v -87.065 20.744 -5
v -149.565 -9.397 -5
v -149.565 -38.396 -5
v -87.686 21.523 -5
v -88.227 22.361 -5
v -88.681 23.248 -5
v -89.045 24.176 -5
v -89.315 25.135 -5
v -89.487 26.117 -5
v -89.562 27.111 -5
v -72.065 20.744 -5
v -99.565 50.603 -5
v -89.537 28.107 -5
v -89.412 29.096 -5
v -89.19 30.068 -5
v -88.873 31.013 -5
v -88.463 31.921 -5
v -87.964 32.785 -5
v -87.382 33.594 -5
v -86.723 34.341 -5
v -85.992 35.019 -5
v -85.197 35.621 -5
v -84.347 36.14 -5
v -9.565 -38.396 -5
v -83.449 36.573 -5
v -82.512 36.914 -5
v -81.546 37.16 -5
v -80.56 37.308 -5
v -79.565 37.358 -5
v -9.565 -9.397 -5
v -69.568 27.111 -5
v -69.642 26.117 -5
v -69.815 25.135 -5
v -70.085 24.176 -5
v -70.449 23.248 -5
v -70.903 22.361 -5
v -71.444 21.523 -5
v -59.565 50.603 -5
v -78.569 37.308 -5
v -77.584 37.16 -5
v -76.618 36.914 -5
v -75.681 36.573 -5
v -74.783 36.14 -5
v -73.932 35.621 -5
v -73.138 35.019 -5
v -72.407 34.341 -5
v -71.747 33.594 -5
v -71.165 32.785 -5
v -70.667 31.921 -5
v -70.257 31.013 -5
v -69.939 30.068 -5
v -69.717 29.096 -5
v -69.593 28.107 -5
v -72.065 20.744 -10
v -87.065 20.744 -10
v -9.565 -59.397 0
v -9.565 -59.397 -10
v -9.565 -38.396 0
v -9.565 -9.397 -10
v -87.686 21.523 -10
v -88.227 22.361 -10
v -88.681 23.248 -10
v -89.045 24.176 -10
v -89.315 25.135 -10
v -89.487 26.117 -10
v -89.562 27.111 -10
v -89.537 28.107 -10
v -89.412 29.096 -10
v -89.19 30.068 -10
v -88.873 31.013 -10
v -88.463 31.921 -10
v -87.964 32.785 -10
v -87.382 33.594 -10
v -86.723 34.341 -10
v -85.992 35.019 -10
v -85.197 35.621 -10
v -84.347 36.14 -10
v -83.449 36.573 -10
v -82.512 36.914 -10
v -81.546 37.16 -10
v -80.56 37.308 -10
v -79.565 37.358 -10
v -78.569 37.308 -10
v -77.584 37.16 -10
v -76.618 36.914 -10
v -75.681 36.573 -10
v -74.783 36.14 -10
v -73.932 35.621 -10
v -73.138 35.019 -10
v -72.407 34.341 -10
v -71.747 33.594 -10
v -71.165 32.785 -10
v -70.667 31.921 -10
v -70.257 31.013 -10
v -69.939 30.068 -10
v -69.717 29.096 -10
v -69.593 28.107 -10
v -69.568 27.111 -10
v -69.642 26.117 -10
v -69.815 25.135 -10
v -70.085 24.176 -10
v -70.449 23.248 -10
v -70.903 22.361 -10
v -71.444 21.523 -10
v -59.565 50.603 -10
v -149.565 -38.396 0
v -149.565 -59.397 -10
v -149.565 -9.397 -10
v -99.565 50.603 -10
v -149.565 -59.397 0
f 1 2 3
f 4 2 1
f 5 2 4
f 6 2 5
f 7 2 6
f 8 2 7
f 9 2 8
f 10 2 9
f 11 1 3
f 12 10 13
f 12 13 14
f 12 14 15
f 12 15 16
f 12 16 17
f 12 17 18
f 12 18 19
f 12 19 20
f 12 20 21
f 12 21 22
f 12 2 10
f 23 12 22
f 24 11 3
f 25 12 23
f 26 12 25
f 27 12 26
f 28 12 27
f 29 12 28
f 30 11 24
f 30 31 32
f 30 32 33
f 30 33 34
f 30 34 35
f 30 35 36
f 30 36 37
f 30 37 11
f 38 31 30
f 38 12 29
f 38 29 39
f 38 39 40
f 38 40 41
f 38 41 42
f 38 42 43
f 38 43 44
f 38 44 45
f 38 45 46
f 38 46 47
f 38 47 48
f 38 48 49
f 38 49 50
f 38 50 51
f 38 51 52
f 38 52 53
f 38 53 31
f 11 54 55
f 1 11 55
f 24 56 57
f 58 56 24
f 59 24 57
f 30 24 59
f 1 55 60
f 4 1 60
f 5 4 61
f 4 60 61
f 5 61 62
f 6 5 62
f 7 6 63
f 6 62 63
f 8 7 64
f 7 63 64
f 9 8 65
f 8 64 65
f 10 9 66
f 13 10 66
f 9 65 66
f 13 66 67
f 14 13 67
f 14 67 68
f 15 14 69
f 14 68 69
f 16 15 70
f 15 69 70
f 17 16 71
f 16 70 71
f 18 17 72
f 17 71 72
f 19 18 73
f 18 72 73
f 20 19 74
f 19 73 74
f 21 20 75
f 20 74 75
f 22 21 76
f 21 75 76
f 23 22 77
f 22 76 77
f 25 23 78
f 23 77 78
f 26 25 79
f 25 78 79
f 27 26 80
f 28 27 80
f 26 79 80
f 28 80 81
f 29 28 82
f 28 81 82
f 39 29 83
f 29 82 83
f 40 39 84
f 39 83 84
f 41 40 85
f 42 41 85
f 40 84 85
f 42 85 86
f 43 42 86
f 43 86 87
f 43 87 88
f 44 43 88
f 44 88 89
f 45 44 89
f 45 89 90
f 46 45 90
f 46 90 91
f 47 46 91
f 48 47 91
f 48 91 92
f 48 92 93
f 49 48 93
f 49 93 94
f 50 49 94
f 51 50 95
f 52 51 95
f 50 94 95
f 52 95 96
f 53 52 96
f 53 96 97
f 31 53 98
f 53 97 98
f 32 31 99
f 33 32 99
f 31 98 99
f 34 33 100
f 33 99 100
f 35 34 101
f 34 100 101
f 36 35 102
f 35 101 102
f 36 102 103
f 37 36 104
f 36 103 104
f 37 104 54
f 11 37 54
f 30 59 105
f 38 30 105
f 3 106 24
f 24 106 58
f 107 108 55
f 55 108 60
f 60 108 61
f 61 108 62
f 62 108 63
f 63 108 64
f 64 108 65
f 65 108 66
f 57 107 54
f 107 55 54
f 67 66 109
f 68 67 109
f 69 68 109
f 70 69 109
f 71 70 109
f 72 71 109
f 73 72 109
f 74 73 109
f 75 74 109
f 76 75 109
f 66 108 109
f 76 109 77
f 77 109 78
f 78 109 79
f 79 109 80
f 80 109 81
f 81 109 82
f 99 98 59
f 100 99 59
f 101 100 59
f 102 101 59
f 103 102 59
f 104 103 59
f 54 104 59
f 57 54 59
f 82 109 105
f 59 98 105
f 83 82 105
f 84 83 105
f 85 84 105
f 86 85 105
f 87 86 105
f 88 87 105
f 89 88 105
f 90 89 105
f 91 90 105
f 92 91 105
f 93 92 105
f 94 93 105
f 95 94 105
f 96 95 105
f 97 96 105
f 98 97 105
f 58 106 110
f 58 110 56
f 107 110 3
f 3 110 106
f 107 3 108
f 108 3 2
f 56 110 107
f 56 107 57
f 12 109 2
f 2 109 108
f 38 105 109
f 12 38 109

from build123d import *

# Parameters (mm, degrees)
BOSS_EXTRUDE1_START = -10
BOSS_EXTRUDE1_DEPTH = 5
SKETCH1_3_W         = 140
SKETCH1_3_H         = 21.000815728
BOSS_EXTRUDE2_DEPTH = 10


with BuildPart() as part:
    # Sketch1 → Boss-Extrude1 (new body)
    with BuildSketch(Plane.XY.offset(BOSS_EXTRUDE1_START)):
        Polygon((-149.564743262, -9.396609427), (-149.564743262, -38.395793699), (-9.564743262, -38.395793699), (-9.564743262, -9.396609427), (-59.564743262, 50.603390573), (-99.564743262, 50.603390573), align=None)
        with BuildLine():
            Line((-72.064743262, 20.743540142), (-87.064743262, 20.743540142))
            ThreePointArc((-87.064743262, 20.743540142), (-79.564743262, 37.357918419), (-72.064743262, 20.743540142))
        make_face(mode=Mode.SUBTRACT)
    extrude(amount=BOSS_EXTRUDE1_DEPTH)

    # Sketch1<3> → Boss-Extrude2 (add)
    with BuildSketch(Plane.XY):
        with Locations((-79.564743262, -48.896201563)):
            Rectangle(SKETCH1_3_W, SKETCH1_3_H)
    extrude(amount=-BOSS_EXTRUDE2_DEPTH)


solid = part.part
